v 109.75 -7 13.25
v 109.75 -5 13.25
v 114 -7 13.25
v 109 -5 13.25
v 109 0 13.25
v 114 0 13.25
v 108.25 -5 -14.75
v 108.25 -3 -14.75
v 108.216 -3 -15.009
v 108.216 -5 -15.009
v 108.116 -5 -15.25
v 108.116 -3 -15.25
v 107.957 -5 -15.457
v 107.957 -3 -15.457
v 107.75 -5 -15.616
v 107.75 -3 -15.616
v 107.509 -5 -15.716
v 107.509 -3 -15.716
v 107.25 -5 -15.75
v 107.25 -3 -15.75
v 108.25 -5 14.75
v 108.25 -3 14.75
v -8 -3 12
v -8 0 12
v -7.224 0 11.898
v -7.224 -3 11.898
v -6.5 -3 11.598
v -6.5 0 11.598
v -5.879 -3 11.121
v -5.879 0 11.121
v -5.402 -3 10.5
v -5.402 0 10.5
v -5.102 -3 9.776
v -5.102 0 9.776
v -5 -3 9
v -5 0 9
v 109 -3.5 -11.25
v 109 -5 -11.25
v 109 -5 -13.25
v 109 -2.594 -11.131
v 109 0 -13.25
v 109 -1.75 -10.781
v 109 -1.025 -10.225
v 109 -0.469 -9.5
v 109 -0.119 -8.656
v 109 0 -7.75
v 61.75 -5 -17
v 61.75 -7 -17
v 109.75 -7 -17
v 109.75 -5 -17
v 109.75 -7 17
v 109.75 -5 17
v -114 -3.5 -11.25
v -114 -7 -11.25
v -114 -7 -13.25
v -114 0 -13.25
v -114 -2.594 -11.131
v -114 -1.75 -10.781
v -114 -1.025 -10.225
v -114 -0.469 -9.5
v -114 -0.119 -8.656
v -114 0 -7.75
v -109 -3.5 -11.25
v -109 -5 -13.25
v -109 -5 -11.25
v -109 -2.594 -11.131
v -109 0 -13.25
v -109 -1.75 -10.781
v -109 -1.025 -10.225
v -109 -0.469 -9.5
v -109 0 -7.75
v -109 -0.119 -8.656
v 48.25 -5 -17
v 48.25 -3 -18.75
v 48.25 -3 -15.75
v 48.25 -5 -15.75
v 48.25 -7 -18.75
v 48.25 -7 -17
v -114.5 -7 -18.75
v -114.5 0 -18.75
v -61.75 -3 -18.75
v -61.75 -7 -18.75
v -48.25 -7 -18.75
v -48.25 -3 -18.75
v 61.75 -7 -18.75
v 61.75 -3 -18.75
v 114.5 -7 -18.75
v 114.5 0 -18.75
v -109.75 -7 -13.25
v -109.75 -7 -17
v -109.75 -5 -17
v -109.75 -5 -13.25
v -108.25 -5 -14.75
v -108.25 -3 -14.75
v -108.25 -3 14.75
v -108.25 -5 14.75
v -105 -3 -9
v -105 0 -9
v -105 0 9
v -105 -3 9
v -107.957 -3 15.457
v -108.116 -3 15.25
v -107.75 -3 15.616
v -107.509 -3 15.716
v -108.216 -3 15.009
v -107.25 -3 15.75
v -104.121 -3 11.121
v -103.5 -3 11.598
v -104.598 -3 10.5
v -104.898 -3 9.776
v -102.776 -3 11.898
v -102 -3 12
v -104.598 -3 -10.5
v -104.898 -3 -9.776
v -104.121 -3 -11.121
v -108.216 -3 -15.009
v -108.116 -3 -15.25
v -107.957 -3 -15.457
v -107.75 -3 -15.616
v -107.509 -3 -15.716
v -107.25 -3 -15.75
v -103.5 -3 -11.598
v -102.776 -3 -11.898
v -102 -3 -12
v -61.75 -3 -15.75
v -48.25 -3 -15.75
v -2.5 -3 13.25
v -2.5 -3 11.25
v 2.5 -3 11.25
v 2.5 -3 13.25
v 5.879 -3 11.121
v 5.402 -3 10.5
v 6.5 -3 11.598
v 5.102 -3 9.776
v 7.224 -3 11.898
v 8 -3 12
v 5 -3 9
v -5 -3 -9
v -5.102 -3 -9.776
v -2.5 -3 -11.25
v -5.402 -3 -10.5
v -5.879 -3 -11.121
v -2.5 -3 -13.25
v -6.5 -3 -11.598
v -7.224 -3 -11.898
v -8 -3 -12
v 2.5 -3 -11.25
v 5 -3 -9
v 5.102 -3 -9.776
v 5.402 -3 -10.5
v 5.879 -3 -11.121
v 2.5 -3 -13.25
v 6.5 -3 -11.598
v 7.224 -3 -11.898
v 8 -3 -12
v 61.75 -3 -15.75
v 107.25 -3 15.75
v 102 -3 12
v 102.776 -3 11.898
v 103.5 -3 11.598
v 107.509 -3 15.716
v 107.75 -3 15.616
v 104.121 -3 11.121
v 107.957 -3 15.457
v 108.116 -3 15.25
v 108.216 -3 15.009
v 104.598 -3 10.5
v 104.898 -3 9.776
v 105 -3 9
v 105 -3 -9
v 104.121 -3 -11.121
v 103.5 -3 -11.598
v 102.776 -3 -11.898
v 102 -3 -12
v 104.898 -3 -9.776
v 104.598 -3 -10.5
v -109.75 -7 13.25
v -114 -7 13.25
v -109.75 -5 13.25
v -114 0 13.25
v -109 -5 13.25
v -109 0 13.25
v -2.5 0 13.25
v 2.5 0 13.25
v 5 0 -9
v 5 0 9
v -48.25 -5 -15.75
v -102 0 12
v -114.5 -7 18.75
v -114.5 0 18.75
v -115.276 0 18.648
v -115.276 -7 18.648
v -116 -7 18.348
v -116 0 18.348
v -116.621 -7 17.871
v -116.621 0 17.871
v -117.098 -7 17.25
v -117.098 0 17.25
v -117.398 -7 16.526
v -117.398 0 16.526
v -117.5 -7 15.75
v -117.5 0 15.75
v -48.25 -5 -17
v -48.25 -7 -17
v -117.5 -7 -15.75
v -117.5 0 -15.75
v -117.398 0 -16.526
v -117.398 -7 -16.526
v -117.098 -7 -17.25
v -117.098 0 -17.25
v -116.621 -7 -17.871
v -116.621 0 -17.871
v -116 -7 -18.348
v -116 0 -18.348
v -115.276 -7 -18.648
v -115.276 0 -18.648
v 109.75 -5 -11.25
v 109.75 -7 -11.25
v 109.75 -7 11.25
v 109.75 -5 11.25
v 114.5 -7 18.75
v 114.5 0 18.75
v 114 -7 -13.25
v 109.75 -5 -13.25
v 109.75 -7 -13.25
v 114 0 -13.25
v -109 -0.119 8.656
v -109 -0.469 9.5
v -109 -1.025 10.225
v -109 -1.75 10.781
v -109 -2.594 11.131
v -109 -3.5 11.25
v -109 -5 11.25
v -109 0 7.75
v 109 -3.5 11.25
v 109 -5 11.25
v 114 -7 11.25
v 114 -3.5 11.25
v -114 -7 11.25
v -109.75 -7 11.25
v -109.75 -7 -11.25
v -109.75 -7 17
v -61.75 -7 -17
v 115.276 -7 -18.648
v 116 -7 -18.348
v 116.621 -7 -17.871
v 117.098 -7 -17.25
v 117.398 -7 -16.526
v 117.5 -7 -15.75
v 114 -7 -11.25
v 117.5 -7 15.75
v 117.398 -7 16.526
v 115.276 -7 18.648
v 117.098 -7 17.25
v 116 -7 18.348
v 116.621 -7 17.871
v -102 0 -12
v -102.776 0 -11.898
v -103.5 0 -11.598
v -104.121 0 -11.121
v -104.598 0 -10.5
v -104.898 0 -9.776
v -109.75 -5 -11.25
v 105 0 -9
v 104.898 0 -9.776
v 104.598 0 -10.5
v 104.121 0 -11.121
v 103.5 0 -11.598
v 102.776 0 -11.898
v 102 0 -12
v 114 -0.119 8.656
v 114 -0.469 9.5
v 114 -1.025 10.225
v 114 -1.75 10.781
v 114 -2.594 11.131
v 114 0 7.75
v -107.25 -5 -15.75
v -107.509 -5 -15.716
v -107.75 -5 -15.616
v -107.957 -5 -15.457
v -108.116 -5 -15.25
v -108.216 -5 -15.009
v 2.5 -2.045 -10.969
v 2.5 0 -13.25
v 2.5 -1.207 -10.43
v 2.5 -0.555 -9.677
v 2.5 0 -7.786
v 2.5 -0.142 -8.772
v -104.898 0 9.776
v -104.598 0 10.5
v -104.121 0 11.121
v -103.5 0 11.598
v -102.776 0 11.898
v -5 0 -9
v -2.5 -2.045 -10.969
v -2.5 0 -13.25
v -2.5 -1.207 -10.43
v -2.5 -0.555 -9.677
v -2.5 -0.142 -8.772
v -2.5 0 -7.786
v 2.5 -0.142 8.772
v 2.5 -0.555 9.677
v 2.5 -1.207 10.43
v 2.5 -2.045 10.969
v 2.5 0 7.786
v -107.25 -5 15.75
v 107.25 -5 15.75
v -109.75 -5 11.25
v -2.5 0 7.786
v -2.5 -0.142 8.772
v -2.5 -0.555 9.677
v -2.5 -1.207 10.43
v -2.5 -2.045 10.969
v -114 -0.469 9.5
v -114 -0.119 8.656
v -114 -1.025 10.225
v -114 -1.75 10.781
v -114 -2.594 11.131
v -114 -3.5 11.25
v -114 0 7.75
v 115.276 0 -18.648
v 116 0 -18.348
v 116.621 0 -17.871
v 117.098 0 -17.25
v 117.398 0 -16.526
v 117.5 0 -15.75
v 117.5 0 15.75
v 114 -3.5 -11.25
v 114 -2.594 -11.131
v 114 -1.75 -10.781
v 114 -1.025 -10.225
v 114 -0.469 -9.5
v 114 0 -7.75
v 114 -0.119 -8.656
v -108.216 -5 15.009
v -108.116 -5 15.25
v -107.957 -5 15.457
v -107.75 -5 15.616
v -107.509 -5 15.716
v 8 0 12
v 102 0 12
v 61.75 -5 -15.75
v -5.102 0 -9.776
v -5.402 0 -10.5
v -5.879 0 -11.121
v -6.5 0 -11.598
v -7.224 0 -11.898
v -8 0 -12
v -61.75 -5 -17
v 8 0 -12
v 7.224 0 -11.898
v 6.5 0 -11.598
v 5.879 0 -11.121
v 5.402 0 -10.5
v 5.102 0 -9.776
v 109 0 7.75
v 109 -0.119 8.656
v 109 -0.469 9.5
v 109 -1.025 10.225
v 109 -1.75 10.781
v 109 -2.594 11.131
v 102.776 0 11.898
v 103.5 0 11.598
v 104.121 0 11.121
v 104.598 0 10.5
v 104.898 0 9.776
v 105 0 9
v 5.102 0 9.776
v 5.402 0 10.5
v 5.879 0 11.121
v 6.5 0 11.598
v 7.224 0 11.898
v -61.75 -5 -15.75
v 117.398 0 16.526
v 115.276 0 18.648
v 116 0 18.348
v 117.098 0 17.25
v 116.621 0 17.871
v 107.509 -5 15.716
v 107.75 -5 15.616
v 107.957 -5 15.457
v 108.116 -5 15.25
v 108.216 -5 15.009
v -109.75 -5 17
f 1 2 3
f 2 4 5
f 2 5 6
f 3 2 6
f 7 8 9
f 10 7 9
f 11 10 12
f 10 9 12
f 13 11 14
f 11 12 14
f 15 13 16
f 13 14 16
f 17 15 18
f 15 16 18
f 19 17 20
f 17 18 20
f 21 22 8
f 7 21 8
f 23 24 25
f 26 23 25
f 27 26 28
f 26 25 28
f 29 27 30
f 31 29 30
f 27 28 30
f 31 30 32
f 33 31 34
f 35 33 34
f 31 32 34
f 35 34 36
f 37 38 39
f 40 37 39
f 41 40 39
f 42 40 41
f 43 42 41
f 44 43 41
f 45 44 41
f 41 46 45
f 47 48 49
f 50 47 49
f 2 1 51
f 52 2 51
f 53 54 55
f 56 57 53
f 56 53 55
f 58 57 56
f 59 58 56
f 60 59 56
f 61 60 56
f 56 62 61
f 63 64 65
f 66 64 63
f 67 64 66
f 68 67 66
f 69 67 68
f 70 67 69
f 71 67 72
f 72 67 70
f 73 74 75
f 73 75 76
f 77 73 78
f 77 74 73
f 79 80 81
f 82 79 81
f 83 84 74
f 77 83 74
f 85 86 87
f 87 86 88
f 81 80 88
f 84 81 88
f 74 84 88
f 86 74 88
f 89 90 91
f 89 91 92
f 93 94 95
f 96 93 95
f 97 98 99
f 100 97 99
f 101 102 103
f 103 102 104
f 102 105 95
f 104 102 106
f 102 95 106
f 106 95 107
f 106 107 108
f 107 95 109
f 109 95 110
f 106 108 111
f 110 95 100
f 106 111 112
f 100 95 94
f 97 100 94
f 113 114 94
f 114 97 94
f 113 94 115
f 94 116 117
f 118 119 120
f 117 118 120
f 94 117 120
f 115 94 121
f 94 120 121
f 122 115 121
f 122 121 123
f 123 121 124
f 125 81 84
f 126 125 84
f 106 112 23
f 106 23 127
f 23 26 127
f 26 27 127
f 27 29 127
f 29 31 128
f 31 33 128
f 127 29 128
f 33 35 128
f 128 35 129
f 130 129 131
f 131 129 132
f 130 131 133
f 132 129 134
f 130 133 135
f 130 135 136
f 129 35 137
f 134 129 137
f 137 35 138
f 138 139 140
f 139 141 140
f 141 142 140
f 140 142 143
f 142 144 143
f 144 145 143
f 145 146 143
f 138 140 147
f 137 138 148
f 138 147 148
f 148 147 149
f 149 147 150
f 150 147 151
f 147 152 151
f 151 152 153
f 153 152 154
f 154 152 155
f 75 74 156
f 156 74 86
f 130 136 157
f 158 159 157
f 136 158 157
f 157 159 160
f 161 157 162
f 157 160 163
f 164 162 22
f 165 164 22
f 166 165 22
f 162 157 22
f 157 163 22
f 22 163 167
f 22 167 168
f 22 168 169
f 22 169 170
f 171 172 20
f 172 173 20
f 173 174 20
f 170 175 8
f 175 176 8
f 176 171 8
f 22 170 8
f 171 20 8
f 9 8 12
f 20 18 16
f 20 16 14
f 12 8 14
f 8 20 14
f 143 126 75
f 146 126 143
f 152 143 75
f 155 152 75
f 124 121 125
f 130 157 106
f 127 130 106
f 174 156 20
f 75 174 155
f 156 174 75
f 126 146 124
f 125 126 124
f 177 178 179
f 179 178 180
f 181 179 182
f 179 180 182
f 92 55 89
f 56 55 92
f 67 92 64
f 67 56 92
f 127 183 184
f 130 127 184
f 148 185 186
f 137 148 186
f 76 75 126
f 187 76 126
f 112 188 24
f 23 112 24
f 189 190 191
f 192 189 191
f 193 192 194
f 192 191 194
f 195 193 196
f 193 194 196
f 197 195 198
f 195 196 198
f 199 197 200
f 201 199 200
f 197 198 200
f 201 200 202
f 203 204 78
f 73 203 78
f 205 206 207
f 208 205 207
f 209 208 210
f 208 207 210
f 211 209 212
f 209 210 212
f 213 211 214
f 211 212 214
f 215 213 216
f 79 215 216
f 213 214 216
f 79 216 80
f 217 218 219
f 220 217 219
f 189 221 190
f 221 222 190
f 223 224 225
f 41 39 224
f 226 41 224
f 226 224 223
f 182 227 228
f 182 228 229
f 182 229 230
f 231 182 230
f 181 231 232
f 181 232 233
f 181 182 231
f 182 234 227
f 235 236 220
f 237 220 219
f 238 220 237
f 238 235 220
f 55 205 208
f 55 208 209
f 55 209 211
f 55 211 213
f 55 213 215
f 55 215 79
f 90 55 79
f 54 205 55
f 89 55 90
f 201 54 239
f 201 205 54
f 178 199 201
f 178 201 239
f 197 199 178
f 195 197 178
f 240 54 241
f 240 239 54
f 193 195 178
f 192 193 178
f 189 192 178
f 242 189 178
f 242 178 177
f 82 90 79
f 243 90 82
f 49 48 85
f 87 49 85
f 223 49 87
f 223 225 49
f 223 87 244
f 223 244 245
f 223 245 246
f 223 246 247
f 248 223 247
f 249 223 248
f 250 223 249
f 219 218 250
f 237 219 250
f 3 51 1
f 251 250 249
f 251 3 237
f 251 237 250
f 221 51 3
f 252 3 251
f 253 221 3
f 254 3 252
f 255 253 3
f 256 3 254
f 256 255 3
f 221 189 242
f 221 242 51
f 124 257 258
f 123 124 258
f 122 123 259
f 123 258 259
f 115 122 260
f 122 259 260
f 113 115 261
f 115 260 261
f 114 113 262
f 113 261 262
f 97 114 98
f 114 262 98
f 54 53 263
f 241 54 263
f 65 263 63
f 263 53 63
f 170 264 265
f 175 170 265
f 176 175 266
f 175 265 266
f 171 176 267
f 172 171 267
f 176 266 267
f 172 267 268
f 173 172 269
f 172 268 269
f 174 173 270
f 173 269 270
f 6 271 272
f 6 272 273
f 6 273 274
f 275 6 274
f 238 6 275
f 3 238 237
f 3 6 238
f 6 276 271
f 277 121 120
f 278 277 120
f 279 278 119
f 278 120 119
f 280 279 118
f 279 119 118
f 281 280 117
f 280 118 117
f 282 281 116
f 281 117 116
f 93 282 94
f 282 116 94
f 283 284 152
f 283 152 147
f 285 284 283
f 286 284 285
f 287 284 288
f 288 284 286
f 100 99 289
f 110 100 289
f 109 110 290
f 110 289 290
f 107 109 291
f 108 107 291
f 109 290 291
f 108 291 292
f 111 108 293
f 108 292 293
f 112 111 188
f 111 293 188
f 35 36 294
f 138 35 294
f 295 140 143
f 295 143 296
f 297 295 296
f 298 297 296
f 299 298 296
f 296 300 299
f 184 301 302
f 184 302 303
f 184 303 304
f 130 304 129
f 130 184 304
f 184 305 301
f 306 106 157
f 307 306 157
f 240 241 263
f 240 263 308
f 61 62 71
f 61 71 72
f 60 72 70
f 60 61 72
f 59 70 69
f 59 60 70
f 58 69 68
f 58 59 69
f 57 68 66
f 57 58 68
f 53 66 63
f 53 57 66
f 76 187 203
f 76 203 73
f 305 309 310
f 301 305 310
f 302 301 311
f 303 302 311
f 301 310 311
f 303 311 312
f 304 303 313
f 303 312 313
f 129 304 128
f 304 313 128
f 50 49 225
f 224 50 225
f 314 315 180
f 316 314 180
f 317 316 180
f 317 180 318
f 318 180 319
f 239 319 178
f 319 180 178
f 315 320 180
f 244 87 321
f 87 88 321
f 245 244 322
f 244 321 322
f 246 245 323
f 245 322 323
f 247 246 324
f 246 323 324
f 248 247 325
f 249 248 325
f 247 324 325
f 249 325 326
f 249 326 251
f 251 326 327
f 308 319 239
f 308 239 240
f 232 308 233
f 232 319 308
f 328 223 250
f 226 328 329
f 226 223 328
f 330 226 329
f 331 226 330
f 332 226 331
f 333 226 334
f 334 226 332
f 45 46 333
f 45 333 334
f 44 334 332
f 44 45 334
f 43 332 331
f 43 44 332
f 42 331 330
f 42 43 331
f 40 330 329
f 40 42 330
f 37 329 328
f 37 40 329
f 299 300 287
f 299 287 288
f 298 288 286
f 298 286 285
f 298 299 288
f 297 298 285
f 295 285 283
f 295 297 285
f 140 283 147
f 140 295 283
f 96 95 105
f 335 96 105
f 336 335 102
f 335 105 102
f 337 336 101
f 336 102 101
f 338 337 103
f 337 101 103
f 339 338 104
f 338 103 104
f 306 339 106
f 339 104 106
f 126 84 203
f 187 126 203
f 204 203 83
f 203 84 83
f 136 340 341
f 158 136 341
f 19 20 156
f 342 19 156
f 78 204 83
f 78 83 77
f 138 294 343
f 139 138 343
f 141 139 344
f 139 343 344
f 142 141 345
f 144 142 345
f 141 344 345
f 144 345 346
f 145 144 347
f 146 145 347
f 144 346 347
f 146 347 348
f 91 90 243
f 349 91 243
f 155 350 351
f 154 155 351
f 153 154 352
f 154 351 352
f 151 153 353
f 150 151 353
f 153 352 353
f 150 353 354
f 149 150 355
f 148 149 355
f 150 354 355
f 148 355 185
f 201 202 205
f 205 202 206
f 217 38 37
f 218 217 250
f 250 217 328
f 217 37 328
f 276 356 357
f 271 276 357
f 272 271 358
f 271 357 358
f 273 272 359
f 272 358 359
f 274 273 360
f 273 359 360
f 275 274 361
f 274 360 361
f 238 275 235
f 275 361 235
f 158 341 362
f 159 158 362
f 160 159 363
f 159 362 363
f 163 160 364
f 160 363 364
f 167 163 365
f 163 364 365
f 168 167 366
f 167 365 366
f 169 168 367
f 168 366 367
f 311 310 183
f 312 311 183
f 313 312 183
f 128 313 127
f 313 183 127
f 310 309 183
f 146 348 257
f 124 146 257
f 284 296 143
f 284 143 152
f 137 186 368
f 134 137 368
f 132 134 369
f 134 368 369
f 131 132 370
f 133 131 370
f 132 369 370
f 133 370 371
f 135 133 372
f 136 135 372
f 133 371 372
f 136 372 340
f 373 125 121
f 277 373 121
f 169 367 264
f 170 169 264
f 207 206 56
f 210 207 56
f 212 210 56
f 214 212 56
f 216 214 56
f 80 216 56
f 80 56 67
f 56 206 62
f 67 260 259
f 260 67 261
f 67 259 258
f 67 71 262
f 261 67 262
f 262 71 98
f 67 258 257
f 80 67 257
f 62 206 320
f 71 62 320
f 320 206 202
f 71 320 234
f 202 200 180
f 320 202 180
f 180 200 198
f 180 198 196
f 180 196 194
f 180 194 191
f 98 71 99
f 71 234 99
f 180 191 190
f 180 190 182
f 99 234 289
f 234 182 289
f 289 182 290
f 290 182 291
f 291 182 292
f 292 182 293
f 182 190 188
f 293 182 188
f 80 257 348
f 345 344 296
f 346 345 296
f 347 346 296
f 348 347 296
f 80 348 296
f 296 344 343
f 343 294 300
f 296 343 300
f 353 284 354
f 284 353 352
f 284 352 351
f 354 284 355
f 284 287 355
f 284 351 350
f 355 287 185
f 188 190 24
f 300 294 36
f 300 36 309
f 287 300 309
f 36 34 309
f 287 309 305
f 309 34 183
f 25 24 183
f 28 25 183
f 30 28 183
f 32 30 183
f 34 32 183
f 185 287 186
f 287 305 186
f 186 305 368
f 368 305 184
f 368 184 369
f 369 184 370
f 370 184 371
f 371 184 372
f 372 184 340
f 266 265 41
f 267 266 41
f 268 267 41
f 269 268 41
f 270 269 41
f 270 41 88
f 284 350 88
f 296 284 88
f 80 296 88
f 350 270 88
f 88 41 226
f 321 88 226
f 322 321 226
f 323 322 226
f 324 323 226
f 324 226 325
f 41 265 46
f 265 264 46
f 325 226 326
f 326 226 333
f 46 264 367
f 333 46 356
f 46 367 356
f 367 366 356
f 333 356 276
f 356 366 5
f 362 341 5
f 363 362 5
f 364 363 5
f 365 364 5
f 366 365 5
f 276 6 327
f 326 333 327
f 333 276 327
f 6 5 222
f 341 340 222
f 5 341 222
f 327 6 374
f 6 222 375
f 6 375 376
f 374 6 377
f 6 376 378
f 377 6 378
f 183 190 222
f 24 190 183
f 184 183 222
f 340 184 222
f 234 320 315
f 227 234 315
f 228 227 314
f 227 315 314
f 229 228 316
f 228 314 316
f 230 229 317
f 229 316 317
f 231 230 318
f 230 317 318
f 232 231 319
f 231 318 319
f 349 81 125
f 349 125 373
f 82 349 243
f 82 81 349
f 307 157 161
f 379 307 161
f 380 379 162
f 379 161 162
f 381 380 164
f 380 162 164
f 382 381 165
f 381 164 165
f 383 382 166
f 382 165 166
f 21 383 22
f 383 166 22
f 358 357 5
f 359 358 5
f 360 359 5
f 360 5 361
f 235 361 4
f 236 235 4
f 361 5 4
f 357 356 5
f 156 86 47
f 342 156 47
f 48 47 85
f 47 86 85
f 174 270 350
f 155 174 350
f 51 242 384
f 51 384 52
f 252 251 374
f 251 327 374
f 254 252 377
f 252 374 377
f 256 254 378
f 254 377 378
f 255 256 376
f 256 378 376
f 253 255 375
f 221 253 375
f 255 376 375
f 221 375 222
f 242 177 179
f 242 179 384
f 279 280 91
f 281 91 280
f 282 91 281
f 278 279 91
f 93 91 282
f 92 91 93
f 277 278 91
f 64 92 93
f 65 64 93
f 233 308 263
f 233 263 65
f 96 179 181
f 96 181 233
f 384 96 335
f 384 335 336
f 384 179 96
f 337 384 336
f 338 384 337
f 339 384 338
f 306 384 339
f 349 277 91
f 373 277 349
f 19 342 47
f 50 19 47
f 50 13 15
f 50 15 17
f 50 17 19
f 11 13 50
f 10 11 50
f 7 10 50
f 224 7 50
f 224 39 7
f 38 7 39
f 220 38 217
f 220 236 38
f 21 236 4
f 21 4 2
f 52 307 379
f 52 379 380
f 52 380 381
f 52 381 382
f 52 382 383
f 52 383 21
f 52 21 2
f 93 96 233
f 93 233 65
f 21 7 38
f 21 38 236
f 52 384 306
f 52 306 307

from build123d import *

# Parameters (mm, degrees)
F0_W        = 5
F0_H        = 2
F1_DEPTH    = 3
F2_W        = 5
F2_H        = 2
F3_DEPTH    = 4
F4_W        = 219.5
F4_H        = 34
F4_W_2      = 214.53166008
F4_H_2      = 28.9933998138
F5_DEPTH    = 2
F6_W        = 13.5
F6_H        = 4
F7_DEPTH    = 25
F8_T1_DEPTH = 5
F8_T3_DEPTH = 5
F8_T5_DEPTH = 5


# Not quite as in the source:
# - a fillet or chamfer that OpenCascade refuses, or shapes differently, is made with other operations: its cross-section is extruded or revolved along the edge and cut away or added
# - a feature names something its author has since deleted; it is built from what else it names


with BuildPart() as f1:
    # F0 (on Front) → F1 (new body)
    with BuildSketch(Plane.XZ):
        with BuildLine():
            ThreePointArc((117.5, 15.75), (116.6213203436, 17.8713203436), (114.5, 18.75))
            Line((114.5, 18.75), (-114.5, 18.75))
            ThreePointArc((-114.5, 18.75), (-116.6213203436, 17.8713203436), (-117.5, 15.75))
            Line((-117.5, 15.75), (-117.5, -15.75))
            ThreePointArc((-117.5, -15.75), (-116.6213203436, -17.8713203436), (-114.5, -18.75))
            Line((-114.5, -18.75), (114.5, -18.75))
            ThreePointArc((114.5, -18.75), (116.6213203436, -17.8713203436), (117.5, -15.75))
            Line((117.5, -15.75), (117.5, 15.75))
        make_face()
        with Locations((-111.5, -12.25)):
            Rectangle(F0_W, F0_H, mode=Mode.SUBTRACT)
        with Locations((0, -12.25)):
            Rectangle(F0_W, F0_H, mode=Mode.SUBTRACT)
        with Locations((111.5, -12.25)):
            Rectangle(F0_W, F0_H, mode=Mode.SUBTRACT)
        with BuildLine():
            Line((-102, 12), (-8, 12))
            ThreePointArc((-8, 12), (-5.8786796564, 11.1213203436), (-5, 9))
            Line((-5, 9), (-5, -9))
            ThreePointArc((-5, -9), (-5.8786796564, -11.1213203436), (-8, -12))
            Line((-8, -12), (-102, -12))
            ThreePointArc((-102, -12), (-104.1213203436, -11.1213203436), (-105, -9))
            Line((-105, -9), (-105, 9))
            ThreePointArc((-105, 9), (-104.1213203436, 11.1213203436), (-102, 12))
        make_face(mode=Mode.SUBTRACT)
        with Locations((-111.5, 12.25)):
            Rectangle(F0_W, F0_H, mode=Mode.SUBTRACT)
        with BuildLine():
            Line((8, 12), (102, 12))
            ThreePointArc((102, 12), (104.1213203436, 11.1213203436), (105, 9))
            Line((105, 9), (105, -9))
            ThreePointArc((105, -9), (104.1213203436, -11.1213203436), (102, -12))
            Line((102, -12), (8, -12))
            ThreePointArc((8, -12), (5.8786796564, -11.1213203436), (5, -9))
            Line((5, -9), (5, 9))
            ThreePointArc((5, 9), (5.8786796564, 11.1213203436), (8, 12))
        make_face(mode=Mode.SUBTRACT)
        with Locations((0, 12.25)):
            Rectangle(F0_W, F0_H, mode=Mode.SUBTRACT)
        with Locations((111.5, 12.25)):
            Rectangle(F0_W, F0_H, mode=Mode.SUBTRACT)
    extrude(amount=F1_DEPTH)

    # F2 (on face) → F3 (join)
    with BuildSketch(Plane.XZ.offset(3)):
        with BuildLine():
            Line((-114.5, -18.75), (114.5, -18.75))
            ThreePointArc((114.5, -18.75), (116.6213203436, -17.8713203436), (117.5, -15.75))
            Line((117.5, -15.75), (117.5, 15.75))
            ThreePointArc((117.5, 15.75), (116.6213203436, 17.8713203436), (114.5, 18.75))
            Line((114.5, 18.75), (-114.5, 18.75))
            ThreePointArc((-114.5, 18.75), (-116.6213203436, 17.8713203436), (-117.5, 15.75))
            Line((-117.5, 15.75), (-117.5, -15.75))
            ThreePointArc((-117.5, -15.75), (-116.6213203436, -17.8713203436), (-114.5, -18.75))
        make_face()
        with Locations((-111.5, -12.25)):
            Rectangle(F2_W, F2_H, mode=Mode.SUBTRACT)
        with Locations((111.5, -12.25)):
            Rectangle(F2_W, F2_H, mode=Mode.SUBTRACT)
        with BuildLine():
            Line((-107.25, 15.75), (107.25, 15.75))
            ThreePointArc((107.25, 15.75), (107.9571067812, 15.4571067812), (108.25, 14.75))
            Line((108.25, 14.75), (108.25, -14.75))
            ThreePointArc((108.25, -14.75), (107.9571067812, -15.4571067812), (107.25, -15.75))
            Line((107.25, -15.75), (-107.25, -15.75))
            ThreePointArc((-107.25, -15.75), (-107.9571067812, -15.4571067812), (-108.25, -14.75))
            Line((-108.25, -14.75), (-108.25, 14.75))
            ThreePointArc((-108.25, 14.75), (-107.9571067812, 15.4571067812), (-107.25, 15.75))
        make_face(mode=Mode.SUBTRACT)
        with Locations((-111.5, 12.25)):
            Rectangle(F2_W, F2_H, mode=Mode.SUBTRACT)
        with Locations((111.5, 12.25)):
            Rectangle(F2_W, F2_H, mode=Mode.SUBTRACT)
    extrude(amount=F3_DEPTH)

    # F4 (on face) → F5 (cut)
    with BuildSketch(Plane.XZ.offset(7)):
        Rectangle(F4_W, F4_H)
        Rectangle(F4_W_2, F4_H_2, mode=Mode.SUBTRACT)
    extrude(amount=-F5_DEPTH, mode=Mode.SUBTRACT)

    # F6 (on face) → F7 (cut)
    with BuildSketch(Plane(origin=(0, 0, -18.75), x_dir=(1, 0, 0), z_dir=(0, 0, -1))):
        with Locations((-55, 5)):
            Rectangle(F6_W, F6_H)
        with Locations((55, 5)):
            Rectangle(F6_W, F6_H)
    extrude(amount=-F7_DEPTH, mode=Mode.SUBTRACT)

    # F8: fillet of radius 3.5 on 6 edges, made by hand

    # F8_s2 → F8_t1 (cut)
    with BuildSketch(Plane.YZ.offset(-2.5)):
        with BuildLine():
            ThreePointArc((0, 7.7858983849), (-0.8542486889, 10.0771862323), (-3, 11.25))
            Line((-3, 11.25), (0, 11.25))
            Line((0, 11.25), (0, 7.7858983849))
        make_face()
        with BuildLine():
            ThreePointArc((0, -7.7858983849), (-0.8542486889, -10.0771862323), (-3, -11.25))
            Line((-3, -11.25), (0, -11.25))
            Line((0, -11.25), (0, -7.7858983849))
        make_face()
    extrude(amount=F8_T1_DEPTH, mode=Mode.SUBTRACT)

    # F8_s4 → F8_t3 (cut)
    with BuildSketch(Plane.YZ.offset(109)):
        with BuildLine():
            ThreePointArc((0, 7.75), (-1.0251262658, 10.2248737342), (-3.5, 11.25))
            Line((-3.5, 11.25), (0, 11.25))
            Line((0, 11.25), (0, 7.75))
        make_face()
        with BuildLine():
            ThreePointArc((0, -7.75), (-1.0251262658, -10.2248737342), (-3.5, -11.25))
            Line((-3.5, -11.25), (0, -11.25))
            Line((0, -11.25), (0, -7.75))
        make_face()
    extrude(amount=F8_T3_DEPTH, mode=Mode.SUBTRACT)

    # F8_s6 → F8_t5 (cut)
    with BuildSketch(Plane.YZ.offset(-114)):
        with BuildLine():
            ThreePointArc((0, -7.75), (-1.0251262658, -10.2248737342), (-3.5, -11.25))
            Line((-3.5, -11.25), (0, -11.25))
            Line((0, -11.25), (0, -7.75))
        make_face()
        with BuildLine():
            ThreePointArc((0, 7.75), (-1.0251262658, 10.2248737342), (-3.5, 11.25))
            Line((-3.5, 11.25), (0, 11.25))
            Line((0, 11.25), (0, 7.75))
        make_face()
    extrude(amount=F8_T5_DEPTH, mode=Mode.SUBTRACT)


solid = f1.part
